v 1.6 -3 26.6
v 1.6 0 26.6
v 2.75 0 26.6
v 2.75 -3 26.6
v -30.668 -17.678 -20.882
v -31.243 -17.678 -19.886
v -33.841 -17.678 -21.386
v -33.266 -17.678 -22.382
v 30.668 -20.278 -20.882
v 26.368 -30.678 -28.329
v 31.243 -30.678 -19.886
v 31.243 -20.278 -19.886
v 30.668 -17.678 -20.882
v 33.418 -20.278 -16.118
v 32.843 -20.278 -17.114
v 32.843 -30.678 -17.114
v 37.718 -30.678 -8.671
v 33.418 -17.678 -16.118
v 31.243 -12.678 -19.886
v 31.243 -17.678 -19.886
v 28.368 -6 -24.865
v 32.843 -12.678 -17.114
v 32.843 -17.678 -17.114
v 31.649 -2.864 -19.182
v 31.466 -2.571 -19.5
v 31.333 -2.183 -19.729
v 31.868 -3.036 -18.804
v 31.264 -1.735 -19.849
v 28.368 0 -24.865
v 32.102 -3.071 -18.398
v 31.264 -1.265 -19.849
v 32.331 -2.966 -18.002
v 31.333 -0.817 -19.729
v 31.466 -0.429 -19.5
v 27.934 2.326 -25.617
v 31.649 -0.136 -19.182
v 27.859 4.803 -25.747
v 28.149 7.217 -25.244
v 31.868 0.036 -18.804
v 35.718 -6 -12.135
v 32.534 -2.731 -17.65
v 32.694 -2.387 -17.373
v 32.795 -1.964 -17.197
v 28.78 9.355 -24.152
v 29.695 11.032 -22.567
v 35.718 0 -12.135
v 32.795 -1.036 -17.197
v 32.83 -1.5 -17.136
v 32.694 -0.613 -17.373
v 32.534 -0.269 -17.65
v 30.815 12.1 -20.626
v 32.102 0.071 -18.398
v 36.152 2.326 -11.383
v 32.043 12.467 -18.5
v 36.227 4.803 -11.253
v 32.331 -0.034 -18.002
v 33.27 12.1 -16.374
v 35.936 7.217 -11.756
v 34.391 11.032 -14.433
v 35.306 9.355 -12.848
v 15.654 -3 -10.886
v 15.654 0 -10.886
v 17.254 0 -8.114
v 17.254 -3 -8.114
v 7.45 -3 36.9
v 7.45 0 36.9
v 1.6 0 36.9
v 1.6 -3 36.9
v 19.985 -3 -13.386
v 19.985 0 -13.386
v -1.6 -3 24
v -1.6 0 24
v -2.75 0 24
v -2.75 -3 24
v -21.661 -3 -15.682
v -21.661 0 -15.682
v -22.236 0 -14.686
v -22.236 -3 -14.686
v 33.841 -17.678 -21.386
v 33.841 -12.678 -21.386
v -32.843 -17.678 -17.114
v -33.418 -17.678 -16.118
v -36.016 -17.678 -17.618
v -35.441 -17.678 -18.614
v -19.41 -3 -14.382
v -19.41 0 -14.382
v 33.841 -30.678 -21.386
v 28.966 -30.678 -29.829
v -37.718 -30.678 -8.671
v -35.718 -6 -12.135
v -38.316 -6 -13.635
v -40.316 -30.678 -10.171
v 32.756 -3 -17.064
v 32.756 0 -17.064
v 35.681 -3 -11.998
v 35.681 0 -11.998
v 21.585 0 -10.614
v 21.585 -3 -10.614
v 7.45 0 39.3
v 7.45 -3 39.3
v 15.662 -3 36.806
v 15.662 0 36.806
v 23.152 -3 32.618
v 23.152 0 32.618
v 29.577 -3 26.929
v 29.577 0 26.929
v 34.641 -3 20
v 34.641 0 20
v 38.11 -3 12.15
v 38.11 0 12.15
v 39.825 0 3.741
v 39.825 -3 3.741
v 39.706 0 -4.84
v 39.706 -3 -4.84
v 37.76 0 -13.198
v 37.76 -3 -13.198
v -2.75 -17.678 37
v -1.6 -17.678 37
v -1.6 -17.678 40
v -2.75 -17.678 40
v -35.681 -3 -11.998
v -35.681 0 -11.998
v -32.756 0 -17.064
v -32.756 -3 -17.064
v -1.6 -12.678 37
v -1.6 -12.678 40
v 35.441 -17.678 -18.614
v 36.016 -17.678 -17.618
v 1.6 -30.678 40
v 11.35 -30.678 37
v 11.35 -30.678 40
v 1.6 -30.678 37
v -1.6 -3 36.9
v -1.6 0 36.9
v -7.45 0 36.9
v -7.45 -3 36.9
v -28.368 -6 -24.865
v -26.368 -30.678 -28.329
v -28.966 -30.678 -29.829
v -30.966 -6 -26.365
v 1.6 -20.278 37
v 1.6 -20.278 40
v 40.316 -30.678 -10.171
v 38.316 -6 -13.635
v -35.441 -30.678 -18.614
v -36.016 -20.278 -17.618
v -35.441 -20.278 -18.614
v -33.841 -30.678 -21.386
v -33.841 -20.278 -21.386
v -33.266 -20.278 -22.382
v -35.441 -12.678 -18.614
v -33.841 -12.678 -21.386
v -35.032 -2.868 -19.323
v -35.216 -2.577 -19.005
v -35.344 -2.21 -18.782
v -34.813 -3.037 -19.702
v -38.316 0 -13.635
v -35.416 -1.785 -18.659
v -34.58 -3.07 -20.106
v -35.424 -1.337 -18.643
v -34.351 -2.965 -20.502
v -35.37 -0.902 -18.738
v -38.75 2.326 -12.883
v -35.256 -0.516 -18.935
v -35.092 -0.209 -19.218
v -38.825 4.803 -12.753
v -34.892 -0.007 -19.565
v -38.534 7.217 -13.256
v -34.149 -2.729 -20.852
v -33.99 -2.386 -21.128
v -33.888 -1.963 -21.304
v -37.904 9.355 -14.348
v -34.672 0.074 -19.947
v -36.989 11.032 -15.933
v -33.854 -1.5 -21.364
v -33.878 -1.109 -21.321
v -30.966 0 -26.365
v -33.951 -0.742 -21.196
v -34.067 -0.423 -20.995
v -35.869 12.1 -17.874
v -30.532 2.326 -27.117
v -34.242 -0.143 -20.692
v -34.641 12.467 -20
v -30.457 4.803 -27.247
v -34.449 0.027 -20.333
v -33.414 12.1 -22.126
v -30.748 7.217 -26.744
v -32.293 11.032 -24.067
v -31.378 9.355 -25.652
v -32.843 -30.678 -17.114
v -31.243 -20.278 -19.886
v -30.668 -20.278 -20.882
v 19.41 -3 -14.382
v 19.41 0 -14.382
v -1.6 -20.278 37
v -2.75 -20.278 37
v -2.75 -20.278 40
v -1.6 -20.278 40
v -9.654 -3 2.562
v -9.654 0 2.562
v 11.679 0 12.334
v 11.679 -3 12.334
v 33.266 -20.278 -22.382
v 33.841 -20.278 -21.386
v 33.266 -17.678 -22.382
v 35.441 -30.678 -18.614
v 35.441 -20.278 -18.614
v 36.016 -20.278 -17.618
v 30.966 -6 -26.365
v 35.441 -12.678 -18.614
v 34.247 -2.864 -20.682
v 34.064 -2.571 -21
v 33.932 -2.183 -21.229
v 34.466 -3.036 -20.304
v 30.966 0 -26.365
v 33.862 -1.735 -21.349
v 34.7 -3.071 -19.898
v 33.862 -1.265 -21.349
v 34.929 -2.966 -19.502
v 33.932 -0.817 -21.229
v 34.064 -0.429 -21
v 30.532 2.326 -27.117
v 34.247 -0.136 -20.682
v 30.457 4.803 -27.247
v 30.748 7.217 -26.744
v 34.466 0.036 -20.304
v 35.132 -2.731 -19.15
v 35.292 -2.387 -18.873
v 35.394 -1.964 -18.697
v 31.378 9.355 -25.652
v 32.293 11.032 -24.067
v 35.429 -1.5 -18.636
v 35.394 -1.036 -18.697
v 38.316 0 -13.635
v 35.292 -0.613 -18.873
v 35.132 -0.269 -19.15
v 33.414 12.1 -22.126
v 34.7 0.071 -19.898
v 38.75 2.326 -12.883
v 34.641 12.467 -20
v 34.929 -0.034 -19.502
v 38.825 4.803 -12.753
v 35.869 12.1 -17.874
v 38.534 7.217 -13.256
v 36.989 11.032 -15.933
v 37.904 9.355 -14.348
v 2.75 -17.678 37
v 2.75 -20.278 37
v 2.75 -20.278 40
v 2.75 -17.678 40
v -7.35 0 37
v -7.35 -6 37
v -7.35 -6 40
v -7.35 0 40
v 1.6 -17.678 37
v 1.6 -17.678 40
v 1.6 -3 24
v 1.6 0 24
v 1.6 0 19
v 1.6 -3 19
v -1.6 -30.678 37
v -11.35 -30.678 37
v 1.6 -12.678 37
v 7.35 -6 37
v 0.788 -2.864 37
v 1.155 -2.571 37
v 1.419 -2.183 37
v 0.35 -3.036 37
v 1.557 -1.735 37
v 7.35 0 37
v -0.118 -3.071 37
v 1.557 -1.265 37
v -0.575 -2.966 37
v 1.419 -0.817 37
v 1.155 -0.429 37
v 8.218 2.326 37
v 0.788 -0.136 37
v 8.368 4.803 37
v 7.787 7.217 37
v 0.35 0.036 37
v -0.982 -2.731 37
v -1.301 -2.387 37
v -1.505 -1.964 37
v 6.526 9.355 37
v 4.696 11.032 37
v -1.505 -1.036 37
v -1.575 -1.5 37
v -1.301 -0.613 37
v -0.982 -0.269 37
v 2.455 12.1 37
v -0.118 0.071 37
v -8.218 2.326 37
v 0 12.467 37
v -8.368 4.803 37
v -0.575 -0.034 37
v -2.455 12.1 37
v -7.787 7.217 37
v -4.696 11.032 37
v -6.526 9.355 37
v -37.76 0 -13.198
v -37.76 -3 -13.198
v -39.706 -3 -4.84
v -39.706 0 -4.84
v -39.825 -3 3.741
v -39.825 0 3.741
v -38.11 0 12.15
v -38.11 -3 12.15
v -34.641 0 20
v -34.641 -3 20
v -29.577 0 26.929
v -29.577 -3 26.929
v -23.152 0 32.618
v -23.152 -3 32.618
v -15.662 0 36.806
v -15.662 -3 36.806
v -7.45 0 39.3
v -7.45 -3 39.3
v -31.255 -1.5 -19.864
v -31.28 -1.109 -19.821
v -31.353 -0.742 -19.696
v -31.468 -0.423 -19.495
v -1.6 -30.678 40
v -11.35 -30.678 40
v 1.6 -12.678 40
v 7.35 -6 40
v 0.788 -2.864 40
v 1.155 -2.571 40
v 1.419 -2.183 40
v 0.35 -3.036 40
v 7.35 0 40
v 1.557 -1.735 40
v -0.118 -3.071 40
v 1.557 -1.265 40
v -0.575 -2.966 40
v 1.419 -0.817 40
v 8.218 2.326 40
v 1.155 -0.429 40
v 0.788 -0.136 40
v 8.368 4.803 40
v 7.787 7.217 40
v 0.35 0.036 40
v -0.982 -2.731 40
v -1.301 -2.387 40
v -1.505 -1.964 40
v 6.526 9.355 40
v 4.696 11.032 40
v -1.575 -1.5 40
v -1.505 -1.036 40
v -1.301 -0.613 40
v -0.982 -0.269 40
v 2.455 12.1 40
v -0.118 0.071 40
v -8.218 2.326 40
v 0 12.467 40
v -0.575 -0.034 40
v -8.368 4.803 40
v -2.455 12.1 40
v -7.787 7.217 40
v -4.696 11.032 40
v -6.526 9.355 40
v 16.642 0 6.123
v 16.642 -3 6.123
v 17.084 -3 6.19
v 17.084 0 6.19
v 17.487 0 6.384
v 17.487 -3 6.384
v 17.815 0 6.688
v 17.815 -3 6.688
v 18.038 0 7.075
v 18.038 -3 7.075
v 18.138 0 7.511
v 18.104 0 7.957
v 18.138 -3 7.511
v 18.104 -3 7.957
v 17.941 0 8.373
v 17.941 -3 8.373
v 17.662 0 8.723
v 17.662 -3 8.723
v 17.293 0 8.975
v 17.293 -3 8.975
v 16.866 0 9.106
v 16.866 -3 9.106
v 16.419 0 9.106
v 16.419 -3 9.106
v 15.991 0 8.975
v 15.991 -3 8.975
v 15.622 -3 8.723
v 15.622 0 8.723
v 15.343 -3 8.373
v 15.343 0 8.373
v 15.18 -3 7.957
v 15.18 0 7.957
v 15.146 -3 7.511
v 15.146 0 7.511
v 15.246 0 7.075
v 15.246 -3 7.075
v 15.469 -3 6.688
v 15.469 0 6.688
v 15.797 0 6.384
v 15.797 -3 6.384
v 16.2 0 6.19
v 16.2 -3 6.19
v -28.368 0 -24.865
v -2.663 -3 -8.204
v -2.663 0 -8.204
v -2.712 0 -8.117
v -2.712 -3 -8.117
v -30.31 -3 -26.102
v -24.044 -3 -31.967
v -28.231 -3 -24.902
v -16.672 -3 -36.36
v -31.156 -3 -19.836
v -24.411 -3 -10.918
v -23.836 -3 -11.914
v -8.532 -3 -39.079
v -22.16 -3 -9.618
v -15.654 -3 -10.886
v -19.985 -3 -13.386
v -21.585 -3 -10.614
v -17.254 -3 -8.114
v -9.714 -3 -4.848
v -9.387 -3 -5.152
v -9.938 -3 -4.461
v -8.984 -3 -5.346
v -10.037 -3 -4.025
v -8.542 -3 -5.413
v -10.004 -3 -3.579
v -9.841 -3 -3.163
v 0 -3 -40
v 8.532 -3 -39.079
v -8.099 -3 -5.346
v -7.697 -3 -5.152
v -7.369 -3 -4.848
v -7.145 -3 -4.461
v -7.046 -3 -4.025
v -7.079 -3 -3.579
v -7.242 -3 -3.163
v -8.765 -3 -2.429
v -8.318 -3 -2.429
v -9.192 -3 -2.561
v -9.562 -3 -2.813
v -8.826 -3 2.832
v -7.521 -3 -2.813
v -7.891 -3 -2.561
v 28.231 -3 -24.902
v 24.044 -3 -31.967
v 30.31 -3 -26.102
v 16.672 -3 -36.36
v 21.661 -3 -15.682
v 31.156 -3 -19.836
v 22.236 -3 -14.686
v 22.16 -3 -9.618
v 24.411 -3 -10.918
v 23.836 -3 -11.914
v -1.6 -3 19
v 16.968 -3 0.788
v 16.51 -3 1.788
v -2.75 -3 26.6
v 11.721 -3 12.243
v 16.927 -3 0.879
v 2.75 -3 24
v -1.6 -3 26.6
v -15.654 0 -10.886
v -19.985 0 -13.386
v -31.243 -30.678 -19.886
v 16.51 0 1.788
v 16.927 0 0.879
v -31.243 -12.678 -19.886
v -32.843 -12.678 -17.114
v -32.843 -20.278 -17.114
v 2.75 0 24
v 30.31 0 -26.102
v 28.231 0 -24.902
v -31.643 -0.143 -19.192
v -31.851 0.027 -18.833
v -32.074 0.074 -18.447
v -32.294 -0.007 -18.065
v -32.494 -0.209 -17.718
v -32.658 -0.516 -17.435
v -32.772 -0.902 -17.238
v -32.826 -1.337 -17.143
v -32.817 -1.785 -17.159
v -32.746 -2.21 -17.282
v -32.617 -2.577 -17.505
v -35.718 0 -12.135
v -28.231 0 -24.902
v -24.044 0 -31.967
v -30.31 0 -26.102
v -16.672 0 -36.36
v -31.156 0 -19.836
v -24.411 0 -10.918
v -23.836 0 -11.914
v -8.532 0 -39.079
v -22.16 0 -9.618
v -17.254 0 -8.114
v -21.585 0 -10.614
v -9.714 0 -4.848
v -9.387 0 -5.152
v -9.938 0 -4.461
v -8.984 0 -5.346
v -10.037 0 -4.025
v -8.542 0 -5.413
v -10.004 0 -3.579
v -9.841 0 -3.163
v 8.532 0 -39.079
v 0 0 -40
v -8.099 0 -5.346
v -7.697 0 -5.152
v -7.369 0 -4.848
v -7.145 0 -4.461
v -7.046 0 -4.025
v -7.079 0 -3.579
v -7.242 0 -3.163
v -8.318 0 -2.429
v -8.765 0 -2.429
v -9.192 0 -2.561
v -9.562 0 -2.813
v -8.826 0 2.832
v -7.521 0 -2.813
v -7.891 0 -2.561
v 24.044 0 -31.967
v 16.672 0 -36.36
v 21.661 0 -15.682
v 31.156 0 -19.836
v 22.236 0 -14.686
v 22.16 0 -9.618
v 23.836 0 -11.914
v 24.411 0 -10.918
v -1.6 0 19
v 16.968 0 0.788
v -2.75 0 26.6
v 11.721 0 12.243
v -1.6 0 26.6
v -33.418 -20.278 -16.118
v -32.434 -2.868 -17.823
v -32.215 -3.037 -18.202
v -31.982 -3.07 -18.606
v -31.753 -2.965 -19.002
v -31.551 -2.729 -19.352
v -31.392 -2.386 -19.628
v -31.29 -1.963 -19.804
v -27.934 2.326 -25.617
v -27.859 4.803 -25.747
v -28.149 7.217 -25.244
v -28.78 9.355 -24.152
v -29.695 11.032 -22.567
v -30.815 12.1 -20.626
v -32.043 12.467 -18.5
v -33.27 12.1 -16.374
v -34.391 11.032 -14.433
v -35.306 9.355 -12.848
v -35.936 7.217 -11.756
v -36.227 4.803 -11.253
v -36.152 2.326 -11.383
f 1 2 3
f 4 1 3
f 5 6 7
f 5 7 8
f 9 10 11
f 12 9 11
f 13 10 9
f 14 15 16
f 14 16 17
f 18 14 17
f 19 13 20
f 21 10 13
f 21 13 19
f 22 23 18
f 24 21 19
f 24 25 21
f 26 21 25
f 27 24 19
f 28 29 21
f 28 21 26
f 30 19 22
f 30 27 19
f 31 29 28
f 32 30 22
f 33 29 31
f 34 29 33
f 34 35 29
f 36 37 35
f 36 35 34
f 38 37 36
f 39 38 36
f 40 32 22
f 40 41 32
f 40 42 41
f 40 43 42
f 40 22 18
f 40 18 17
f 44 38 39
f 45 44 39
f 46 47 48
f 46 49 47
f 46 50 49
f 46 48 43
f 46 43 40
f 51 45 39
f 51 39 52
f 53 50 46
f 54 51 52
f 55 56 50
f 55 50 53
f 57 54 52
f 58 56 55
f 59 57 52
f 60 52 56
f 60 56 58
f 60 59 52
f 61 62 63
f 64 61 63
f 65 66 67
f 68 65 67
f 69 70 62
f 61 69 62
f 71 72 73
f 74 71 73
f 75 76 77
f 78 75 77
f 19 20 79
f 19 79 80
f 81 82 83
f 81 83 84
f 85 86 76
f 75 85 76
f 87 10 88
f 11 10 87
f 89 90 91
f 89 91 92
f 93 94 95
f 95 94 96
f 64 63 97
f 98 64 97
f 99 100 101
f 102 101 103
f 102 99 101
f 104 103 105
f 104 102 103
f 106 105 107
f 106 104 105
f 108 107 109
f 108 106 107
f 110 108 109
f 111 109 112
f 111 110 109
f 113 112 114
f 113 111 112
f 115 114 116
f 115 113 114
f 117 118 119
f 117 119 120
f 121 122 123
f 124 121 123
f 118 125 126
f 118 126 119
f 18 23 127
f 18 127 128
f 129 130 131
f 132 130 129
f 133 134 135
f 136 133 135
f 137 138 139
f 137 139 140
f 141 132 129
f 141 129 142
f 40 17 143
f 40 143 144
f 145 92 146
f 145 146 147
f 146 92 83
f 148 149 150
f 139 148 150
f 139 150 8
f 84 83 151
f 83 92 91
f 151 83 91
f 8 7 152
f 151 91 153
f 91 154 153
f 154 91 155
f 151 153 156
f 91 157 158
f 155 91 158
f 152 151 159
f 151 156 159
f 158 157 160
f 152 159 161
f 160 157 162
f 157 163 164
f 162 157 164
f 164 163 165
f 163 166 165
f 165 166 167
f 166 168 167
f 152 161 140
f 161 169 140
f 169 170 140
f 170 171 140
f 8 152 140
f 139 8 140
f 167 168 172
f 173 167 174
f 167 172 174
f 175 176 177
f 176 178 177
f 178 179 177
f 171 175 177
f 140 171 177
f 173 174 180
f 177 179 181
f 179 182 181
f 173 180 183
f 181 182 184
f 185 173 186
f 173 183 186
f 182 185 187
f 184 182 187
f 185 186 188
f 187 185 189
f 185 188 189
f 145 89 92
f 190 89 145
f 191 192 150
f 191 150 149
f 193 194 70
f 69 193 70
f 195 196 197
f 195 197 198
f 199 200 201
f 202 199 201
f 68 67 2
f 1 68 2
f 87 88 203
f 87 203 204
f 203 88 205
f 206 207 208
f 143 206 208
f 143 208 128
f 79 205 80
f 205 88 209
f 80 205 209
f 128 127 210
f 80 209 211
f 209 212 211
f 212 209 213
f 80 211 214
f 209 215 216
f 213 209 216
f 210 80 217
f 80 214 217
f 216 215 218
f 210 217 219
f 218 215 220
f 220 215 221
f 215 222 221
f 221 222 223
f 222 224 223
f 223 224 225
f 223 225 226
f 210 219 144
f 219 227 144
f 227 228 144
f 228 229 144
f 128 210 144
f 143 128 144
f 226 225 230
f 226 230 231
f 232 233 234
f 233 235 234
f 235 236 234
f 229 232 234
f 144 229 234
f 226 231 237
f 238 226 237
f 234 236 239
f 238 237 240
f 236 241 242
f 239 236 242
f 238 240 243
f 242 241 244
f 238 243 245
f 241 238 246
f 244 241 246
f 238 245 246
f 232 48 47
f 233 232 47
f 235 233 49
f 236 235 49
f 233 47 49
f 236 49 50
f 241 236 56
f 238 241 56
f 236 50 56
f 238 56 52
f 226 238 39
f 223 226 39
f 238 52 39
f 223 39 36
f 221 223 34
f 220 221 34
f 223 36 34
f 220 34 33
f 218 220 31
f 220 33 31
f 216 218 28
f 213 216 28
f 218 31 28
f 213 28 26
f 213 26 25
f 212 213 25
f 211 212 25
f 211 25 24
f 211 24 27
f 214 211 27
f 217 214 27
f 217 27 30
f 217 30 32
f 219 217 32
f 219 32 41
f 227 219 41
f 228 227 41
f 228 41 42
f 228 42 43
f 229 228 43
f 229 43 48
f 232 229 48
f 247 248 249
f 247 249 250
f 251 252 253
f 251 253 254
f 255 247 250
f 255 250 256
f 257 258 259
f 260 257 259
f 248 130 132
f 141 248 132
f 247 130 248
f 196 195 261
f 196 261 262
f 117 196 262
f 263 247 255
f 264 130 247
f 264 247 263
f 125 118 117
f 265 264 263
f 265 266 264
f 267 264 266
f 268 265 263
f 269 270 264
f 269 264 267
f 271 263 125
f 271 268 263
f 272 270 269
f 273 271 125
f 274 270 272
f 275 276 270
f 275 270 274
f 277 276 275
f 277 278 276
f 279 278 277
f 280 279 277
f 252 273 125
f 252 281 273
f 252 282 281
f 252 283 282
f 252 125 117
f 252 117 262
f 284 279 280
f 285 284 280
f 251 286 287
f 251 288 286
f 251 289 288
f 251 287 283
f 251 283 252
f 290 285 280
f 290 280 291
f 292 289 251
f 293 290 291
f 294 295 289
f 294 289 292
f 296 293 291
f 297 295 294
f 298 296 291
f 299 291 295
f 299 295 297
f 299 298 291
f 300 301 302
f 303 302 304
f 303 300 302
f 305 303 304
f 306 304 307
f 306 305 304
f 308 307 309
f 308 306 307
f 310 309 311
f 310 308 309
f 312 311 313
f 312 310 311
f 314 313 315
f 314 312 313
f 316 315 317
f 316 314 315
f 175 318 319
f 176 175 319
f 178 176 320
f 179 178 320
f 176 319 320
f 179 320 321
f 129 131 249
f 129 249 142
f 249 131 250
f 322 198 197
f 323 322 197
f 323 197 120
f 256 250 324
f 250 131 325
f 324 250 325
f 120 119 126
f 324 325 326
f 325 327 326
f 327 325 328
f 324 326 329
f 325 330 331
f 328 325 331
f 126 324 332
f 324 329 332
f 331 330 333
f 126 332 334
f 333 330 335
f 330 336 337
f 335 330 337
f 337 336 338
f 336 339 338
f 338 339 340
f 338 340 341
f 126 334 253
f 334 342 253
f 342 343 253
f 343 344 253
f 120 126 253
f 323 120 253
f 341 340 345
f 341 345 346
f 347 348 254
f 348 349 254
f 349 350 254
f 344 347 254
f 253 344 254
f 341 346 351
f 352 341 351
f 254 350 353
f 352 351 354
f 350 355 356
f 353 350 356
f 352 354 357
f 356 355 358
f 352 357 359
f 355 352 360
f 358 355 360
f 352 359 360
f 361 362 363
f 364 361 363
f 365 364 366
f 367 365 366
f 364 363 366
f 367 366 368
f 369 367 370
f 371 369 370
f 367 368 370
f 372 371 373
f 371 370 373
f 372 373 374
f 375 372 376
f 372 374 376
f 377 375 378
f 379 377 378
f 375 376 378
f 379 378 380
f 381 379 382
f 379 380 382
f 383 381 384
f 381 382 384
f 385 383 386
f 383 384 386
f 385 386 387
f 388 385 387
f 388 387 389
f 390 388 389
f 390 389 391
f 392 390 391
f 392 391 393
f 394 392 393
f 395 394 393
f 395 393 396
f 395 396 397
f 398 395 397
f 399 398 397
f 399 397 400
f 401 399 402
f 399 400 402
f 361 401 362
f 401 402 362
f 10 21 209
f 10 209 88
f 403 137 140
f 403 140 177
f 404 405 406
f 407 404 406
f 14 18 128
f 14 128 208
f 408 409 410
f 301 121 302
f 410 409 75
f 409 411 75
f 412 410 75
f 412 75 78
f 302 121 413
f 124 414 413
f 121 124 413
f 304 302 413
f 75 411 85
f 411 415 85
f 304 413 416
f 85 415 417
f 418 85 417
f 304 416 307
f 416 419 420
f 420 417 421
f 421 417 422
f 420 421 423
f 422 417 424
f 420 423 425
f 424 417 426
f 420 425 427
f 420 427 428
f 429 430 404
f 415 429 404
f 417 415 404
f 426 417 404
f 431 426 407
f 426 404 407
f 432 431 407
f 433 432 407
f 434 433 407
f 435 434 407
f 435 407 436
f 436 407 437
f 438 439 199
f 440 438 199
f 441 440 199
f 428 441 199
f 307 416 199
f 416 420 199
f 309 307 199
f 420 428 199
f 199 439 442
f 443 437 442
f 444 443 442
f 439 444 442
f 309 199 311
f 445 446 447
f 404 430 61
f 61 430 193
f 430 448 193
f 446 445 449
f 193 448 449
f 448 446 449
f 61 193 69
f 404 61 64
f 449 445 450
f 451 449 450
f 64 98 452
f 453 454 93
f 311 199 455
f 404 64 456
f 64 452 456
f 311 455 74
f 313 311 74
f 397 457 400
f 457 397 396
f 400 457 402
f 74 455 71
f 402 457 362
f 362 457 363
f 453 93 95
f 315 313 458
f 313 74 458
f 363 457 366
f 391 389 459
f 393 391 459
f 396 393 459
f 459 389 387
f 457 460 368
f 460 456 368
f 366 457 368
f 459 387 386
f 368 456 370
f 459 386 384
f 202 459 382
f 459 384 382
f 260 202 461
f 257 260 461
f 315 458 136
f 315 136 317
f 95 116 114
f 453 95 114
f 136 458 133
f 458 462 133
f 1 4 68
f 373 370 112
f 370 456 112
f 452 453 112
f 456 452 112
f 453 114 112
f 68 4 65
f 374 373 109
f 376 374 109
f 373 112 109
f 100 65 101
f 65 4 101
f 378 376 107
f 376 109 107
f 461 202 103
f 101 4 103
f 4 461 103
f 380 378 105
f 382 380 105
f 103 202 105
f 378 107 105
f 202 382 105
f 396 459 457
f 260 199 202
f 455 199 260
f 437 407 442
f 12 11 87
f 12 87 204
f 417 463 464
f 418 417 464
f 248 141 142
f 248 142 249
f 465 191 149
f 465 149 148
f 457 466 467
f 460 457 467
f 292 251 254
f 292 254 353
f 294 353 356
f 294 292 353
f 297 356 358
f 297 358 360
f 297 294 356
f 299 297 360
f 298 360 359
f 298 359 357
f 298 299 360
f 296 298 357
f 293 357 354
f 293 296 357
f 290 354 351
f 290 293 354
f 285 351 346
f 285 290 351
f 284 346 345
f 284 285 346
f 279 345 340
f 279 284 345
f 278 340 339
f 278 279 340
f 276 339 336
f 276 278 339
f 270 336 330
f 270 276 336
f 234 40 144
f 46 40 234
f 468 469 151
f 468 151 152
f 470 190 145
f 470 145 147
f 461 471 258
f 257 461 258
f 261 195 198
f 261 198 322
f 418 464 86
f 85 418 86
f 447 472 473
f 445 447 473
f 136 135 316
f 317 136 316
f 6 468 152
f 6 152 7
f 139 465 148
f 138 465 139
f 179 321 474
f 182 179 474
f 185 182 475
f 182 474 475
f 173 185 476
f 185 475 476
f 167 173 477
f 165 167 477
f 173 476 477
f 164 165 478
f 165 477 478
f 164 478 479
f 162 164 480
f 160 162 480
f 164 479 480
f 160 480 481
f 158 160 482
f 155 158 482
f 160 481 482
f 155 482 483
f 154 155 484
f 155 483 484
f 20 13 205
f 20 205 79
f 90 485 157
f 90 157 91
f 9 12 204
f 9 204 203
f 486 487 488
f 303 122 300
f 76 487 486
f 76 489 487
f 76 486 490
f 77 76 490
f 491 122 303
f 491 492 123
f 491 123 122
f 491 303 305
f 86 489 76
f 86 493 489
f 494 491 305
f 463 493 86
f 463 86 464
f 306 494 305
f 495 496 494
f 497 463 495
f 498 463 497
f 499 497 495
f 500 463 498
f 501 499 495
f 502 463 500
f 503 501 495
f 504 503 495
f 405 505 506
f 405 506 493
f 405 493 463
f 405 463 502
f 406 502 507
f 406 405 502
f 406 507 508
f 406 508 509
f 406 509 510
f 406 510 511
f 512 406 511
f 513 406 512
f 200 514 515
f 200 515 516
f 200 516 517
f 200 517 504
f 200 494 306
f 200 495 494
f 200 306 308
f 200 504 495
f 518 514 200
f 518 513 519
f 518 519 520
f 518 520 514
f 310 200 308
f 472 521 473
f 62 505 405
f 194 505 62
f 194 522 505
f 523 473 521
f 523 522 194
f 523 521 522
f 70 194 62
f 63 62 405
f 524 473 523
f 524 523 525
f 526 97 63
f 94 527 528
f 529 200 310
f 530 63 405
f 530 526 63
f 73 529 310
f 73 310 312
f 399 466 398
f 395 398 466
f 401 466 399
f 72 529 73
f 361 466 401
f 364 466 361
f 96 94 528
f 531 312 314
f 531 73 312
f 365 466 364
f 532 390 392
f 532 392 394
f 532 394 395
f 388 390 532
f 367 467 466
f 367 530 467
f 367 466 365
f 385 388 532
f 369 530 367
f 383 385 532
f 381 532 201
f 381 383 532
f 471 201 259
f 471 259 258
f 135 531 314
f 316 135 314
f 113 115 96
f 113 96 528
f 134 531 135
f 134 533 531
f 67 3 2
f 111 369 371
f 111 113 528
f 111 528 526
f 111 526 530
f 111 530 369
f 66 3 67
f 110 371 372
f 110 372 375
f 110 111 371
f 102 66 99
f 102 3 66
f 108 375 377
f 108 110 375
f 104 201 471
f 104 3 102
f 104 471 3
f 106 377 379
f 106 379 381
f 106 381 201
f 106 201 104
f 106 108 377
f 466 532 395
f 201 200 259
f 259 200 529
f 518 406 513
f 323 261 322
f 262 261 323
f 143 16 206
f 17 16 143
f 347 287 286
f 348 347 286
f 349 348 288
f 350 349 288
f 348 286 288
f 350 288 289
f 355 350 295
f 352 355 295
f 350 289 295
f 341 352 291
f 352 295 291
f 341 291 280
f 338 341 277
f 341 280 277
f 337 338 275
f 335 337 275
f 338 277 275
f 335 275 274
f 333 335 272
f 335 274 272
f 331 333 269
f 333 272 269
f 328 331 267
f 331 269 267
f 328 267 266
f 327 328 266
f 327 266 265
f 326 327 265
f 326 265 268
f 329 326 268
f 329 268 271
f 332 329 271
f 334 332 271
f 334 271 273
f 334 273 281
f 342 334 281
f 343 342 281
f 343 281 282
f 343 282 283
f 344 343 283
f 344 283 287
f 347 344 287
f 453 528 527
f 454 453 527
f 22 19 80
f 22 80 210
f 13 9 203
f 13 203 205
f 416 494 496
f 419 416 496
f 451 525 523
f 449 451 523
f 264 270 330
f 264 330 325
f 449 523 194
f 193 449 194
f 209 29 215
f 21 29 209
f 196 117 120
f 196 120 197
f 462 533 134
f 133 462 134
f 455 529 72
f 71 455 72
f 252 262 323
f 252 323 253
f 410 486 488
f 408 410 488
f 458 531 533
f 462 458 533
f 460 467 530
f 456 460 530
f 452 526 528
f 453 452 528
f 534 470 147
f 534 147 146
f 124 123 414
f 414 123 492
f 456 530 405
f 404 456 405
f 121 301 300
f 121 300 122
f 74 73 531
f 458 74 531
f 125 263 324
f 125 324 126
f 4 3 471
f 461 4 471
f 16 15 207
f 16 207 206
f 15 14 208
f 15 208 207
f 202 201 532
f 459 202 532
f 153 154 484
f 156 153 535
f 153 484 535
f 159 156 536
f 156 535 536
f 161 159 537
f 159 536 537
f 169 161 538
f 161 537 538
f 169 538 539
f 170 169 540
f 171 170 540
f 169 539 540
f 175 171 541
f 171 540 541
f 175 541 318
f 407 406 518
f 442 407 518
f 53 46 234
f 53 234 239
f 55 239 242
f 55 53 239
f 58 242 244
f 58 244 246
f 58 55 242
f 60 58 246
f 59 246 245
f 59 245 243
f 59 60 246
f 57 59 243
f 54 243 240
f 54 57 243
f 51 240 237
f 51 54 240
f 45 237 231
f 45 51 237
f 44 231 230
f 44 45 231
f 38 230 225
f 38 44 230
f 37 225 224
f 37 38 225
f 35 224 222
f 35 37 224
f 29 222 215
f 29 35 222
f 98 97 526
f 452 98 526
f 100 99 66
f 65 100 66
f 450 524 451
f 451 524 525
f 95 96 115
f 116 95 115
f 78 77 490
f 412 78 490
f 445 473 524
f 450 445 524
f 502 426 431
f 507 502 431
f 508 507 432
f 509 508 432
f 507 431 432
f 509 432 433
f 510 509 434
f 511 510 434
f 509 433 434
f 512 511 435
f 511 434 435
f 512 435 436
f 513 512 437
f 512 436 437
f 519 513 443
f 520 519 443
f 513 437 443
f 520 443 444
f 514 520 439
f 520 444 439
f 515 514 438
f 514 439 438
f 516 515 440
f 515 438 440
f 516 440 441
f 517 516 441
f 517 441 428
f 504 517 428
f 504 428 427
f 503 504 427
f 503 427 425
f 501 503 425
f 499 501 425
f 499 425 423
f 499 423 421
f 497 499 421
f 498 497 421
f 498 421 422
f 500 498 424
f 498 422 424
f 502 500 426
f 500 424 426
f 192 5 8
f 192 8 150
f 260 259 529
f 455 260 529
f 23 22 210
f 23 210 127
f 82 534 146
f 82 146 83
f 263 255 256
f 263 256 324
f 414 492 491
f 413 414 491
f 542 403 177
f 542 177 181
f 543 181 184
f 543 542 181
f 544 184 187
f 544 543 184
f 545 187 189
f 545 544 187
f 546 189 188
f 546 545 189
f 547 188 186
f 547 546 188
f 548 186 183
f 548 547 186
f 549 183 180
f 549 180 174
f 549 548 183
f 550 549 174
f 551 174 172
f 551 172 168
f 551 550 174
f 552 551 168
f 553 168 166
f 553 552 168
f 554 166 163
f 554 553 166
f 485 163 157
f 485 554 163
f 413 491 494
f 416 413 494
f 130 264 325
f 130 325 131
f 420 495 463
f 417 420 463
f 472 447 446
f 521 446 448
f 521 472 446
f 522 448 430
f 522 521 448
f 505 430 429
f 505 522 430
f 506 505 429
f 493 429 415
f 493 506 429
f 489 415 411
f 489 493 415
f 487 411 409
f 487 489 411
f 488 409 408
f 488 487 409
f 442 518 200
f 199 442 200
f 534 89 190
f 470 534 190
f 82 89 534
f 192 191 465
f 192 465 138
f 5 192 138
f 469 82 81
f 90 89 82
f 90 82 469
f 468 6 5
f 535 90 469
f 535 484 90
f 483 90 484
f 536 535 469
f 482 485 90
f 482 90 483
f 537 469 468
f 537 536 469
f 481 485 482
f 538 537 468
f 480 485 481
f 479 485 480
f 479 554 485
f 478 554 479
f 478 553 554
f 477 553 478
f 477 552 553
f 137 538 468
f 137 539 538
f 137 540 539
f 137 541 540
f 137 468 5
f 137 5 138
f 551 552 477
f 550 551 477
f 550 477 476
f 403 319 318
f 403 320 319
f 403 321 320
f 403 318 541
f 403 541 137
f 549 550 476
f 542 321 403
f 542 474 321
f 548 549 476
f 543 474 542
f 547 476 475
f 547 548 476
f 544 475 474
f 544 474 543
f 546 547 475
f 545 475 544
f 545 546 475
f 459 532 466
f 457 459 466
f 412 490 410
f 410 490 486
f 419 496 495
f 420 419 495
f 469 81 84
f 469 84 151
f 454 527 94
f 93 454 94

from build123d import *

# Parameters (mm, degrees)
SKETCH1_R          = 40
BASE_FLANGE1_DEPTH = 3
SKETCH9_R          = 1.5
CUT_EXTRUDE2_DEPTH = 3
BASE_FLANGE2_DEPTH = 3
CIRPATTERN3_COUNT  = 3
CUT_EXTRUDE5_DEPTH = 4
CUT_EXTRUDE6_DEPTH = 3
SKETCH41_R         = 1.575
CUT_EXTRUDE7_DEPTH = 5
CIRPATTERN4_COUNT  = 3
CUT_EXTRUDE8_DEPTH = 5
SKETCH43_R         = 1.575
CUT_EXTRUDE9_DEPTH = 5


# Sheet-metal steps are written as plain solids
with BuildPart() as part:
    # Sketch1 → Base-Flange1 (new body)
    with BuildSketch(Plane(origin=(0, 0, 0), x_dir=(1, 0, 0), z_dir=(0, 1, 0))):
        with Locations(Location((0, 0, 0), (0, 0, 270))):
            Circle(SKETCH1_R)
        Polygon((16.510145392, -1.788190184), (16.926601074, -0.879034167), (16.968246643, -0.788118565), (-2.663247704, 8.204099852), (-2.712004351, 8.116791265), (-8.826020957, -2.831585964), (-9.653679096, -2.56245401), (11.679259475, -12.33439999), (11.720905044, -12.243484388), align=None, mode=Mode.SUBTRACT)
    extrude(amount=-BASE_FLANGE1_DEPTH)

    # Sketch9 → Cut-Extrude2 (cut)
    with BuildSketch(Plane.XZ.offset(3)):
        with Locations(Location((-8.541520786, -3.912601137, 0), (0, 0, 270))):
            Circle(SKETCH9_R)
        with Locations(Location((16.642100904, 7.623221268, 0), (0, 0, 270))):
            Circle(SKETCH9_R)
    extrude(amount=-CUT_EXTRUDE2_DEPTH, mode=Mode.SUBTRACT)

    # Sketch25 → Cut-Extrude5 (cut)
    with BuildSketch(Plane(origin=(0, 0, 0), x_dir=(1, 0, 0), z_dir=(0, 1, 0))):
        Polygon((38.316016151, 13.634713282), (35.71793994, 12.134713282), (28.36793994, 24.865286718), (30.966016151, 26.365286718), (30.916016151, 26.451889258), (28.2313374, 24.901889258), (35.6813374, 11.998110742), (38.366016151, 13.548110742), align=None)
        Polygon((-7.35, -40), (-7.35, -37), (7.35, -37), (7.35, -40), (7.45, -40), (7.45, -36.9), (-7.45, -36.9), (-7.45, -40), align=None)
        Polygon((-30.966016151, 26.365286718), (-28.36793994, 24.865286718), (-35.71793994, 12.134713282), (-38.316016151, 13.634713282), (-38.366016151, 13.548110742), (-35.6813374, 11.998110742), (-28.2313374, 24.901889258), (-30.916016151, 26.451889258), align=None)
    extrude(amount=-CUT_EXTRUDE5_DEPTH, mode=Mode.SUBTRACT)


with BuildPart() as body_2:
    # Sketch10 → Base-Flange2 (new body)
    with BuildSketch(Plane.XY.offset(37)):
        with BuildLine():
            Line((7.35, -6), (11.35, -30.677925359))
            Line((11.35, -30.677925359), (1.6, -30.677925359))
            Line((1.6, -30.677925359), (1.6, -20.277925359))
            Line((1.6, -20.277925359), (2.75, -20.277925359))
            Line((2.75, -20.277925359), (2.75, -17.677925359))
            Line((2.75, -17.677925359), (1.6, -17.677925359))
            Line((1.6, -17.677925359), (1.6, -12.677925359))
            Line((1.6, -12.677925359), (-1.6, -12.677925359))
            Line((-1.6, -12.677925359), (-1.6, -17.677925359))
            Line((-1.6, -17.677925359), (-2.75, -17.677925359))
            Line((-2.75, -17.677925359), (-2.75, -20.277925359))
            Line((-2.75, -20.277925359), (-1.6, -20.277925359))
            Line((-1.6, -20.277925359), (-1.6, -30.677925359))
            Line((-1.6, -30.677925359), (-11.35, -30.677925359))
            Line((-11.35, -30.677925359), (-7.35, -6))
            Line((-7.35, -6), (-7.35, 0))
            ThreePointArc((-7.35, 0), (0, 12.466632514), (7.35, 0))
            Line((7.35, 0), (7.35, -6))
        make_face()
    extrude(amount=BASE_FLANGE2_DEPTH)


with BuildPart() as cirpattern3_1:
    # CirPattern3: pattern copy
    add(body_2.part.rotate(Axis((0, 0, 0), (0, 1, 0)), 1 * 360 / CIRPATTERN3_COUNT))


with BuildPart() as cirpattern3_2:
    # CirPattern3: pattern copy
    add(body_2.part.rotate(Axis((0, 0, 0), (0, 1, 0)), 2 * 360 / CIRPATTERN3_COUNT))


with BuildPart() as cut_extrude5_piece_1:
    # of the separate pieces the step leaves, piece 1, a body of its own (cut_extrude5_pieces)
    add(part.part.solids().sort_by_distance((7.45, 0, 39.30009542))[0])

    # Sketch40 → Cut-Extrude6 (cut)
    with BuildSketch(Plane(origin=(0, 0, 0), x_dir=(1, 0, 0), z_dir=(0, 1, 0))):
        Polygon((0, -37), (1.6, -37), (1.6, -26.6), (2.75, -26.6), (2.75, -24), (1.6, -24), (1.6, -19), (-1.6, -19), (-1.6, -24), (-2.75, -24), (-2.75, -26.6), (-1.6, -26.6), (-1.6, -37), align=None)
    cut_extrude6 = extrude(amount=-CUT_EXTRUDE6_DEPTH, mode=Mode.SUBTRACT)

    # CirPattern4: Cut-Extrude6 ×3 about axis
    cirpattern4_axis = Axis((0, 0, 0), (0, 1, 0))
    for i in range(1, CIRPATTERN4_COUNT):
        add(cut_extrude6.rotate(cirpattern4_axis, i * 360 / CIRPATTERN4_COUNT), mode=Mode.SUBTRACT)


with BuildPart() as cut_extrude5_piece_2:
    # of the separate pieces the step leaves, piece 2, a body of its own (cut_extrude5_pieces)
    add(part.part.solids().sort_by_distance((-30.3761839, 0, -26.024746909))[0])


with BuildPart() as cut_extrude5_piece_3:
    # of the separate pieces the step leaves, piece 3, a body of its own (cut_extrude5_pieces)
    add(part.part.solids().sort_by_distance((37.7261839, 0, -13.294173473))[0])


with BuildPart() as cut_extrude5_piece_4:
    # of the separate pieces the step leaves, piece 4, a body of its own (cut_extrude5_pieces)
    add(part.part.solids().sort_by_distance((7.35, 0, 39.318920382))[0])


with BuildPart() as body_2_1:
    add(body_2.part)

    # Combine1: union Cut-Extrude5 piece 4
    add(cut_extrude5_piece_4.part)

    # Sketch41 → Cut-Extrude7 (cut)
    with BuildSketch(Plane(origin=(0, 0, 37), x_dir=(-1, 0, 0), z_dir=(0, 0, -1))):
        with Locations((0, -1.5)):
            Circle(SKETCH41_R)
    extrude(amount=-CUT_EXTRUDE7_DEPTH, mode=Mode.SUBTRACT)


with BuildPart() as cirpattern3_1_1:
    add(cirpattern3_1.part)

    # Combine2: union Cut-Extrude5 piece 3
    add(cut_extrude5_piece_3.part)

    # Sketch43 → Cut-Extrude9 (cut)
    with BuildSketch(Plane(origin=(32.04293994, 0, -18.5), x_dir=(0.500000000000004, 0, 0.8660254037844364), z_dir=(-0.8660254037844365, 0, 0.500000000000004))):
        with Locations((0, -1.5)):
            Circle(SKETCH43_R)
    extrude(amount=-CUT_EXTRUDE9_DEPTH, mode=Mode.SUBTRACT)


with BuildPart() as cirpattern3_2_1:
    add(cirpattern3_2.part)

    # Combine3: union Cut-Extrude5 piece 2
    add(cut_extrude5_piece_2.part)

    # Sketch42 → Cut-Extrude8 (cut)
    with BuildSketch(Plane(origin=(-32.04293994, 0, -18.5), x_dir=(0.49999999999999195, 0, -0.8660254037844434), z_dir=(0.8660254037844434, 0, 0.49999999999999195))):
        with BuildLine():
            ThreePointArc((1.575, -1.5), (1.464638731, -0.920812305), (1.149021097, -0.422792722))
            Line((1.149021097, -0.422792722), (-1.149021097, -2.577207278))
            ThreePointArc((-1.149021097, -2.577207278), (0.579187695, -2.964638731), (1.575, -1.5))
        make_face()
        with BuildLine():
            Line((-1.149021097, -2.577207278), (1.149021097, -0.422792722))
            ThreePointArc((1.149021097, -0.422792722), (-1.077207278, -0.350978903), (-1.149021097, -2.577207278))
        make_face()
    extrude(amount=-CUT_EXTRUDE8_DEPTH, mode=Mode.SUBTRACT)


solid = Compound([cut_extrude5_piece_1.part, body_2_1.part, cirpattern3_1_1.part, cirpattern3_2_1.part])
